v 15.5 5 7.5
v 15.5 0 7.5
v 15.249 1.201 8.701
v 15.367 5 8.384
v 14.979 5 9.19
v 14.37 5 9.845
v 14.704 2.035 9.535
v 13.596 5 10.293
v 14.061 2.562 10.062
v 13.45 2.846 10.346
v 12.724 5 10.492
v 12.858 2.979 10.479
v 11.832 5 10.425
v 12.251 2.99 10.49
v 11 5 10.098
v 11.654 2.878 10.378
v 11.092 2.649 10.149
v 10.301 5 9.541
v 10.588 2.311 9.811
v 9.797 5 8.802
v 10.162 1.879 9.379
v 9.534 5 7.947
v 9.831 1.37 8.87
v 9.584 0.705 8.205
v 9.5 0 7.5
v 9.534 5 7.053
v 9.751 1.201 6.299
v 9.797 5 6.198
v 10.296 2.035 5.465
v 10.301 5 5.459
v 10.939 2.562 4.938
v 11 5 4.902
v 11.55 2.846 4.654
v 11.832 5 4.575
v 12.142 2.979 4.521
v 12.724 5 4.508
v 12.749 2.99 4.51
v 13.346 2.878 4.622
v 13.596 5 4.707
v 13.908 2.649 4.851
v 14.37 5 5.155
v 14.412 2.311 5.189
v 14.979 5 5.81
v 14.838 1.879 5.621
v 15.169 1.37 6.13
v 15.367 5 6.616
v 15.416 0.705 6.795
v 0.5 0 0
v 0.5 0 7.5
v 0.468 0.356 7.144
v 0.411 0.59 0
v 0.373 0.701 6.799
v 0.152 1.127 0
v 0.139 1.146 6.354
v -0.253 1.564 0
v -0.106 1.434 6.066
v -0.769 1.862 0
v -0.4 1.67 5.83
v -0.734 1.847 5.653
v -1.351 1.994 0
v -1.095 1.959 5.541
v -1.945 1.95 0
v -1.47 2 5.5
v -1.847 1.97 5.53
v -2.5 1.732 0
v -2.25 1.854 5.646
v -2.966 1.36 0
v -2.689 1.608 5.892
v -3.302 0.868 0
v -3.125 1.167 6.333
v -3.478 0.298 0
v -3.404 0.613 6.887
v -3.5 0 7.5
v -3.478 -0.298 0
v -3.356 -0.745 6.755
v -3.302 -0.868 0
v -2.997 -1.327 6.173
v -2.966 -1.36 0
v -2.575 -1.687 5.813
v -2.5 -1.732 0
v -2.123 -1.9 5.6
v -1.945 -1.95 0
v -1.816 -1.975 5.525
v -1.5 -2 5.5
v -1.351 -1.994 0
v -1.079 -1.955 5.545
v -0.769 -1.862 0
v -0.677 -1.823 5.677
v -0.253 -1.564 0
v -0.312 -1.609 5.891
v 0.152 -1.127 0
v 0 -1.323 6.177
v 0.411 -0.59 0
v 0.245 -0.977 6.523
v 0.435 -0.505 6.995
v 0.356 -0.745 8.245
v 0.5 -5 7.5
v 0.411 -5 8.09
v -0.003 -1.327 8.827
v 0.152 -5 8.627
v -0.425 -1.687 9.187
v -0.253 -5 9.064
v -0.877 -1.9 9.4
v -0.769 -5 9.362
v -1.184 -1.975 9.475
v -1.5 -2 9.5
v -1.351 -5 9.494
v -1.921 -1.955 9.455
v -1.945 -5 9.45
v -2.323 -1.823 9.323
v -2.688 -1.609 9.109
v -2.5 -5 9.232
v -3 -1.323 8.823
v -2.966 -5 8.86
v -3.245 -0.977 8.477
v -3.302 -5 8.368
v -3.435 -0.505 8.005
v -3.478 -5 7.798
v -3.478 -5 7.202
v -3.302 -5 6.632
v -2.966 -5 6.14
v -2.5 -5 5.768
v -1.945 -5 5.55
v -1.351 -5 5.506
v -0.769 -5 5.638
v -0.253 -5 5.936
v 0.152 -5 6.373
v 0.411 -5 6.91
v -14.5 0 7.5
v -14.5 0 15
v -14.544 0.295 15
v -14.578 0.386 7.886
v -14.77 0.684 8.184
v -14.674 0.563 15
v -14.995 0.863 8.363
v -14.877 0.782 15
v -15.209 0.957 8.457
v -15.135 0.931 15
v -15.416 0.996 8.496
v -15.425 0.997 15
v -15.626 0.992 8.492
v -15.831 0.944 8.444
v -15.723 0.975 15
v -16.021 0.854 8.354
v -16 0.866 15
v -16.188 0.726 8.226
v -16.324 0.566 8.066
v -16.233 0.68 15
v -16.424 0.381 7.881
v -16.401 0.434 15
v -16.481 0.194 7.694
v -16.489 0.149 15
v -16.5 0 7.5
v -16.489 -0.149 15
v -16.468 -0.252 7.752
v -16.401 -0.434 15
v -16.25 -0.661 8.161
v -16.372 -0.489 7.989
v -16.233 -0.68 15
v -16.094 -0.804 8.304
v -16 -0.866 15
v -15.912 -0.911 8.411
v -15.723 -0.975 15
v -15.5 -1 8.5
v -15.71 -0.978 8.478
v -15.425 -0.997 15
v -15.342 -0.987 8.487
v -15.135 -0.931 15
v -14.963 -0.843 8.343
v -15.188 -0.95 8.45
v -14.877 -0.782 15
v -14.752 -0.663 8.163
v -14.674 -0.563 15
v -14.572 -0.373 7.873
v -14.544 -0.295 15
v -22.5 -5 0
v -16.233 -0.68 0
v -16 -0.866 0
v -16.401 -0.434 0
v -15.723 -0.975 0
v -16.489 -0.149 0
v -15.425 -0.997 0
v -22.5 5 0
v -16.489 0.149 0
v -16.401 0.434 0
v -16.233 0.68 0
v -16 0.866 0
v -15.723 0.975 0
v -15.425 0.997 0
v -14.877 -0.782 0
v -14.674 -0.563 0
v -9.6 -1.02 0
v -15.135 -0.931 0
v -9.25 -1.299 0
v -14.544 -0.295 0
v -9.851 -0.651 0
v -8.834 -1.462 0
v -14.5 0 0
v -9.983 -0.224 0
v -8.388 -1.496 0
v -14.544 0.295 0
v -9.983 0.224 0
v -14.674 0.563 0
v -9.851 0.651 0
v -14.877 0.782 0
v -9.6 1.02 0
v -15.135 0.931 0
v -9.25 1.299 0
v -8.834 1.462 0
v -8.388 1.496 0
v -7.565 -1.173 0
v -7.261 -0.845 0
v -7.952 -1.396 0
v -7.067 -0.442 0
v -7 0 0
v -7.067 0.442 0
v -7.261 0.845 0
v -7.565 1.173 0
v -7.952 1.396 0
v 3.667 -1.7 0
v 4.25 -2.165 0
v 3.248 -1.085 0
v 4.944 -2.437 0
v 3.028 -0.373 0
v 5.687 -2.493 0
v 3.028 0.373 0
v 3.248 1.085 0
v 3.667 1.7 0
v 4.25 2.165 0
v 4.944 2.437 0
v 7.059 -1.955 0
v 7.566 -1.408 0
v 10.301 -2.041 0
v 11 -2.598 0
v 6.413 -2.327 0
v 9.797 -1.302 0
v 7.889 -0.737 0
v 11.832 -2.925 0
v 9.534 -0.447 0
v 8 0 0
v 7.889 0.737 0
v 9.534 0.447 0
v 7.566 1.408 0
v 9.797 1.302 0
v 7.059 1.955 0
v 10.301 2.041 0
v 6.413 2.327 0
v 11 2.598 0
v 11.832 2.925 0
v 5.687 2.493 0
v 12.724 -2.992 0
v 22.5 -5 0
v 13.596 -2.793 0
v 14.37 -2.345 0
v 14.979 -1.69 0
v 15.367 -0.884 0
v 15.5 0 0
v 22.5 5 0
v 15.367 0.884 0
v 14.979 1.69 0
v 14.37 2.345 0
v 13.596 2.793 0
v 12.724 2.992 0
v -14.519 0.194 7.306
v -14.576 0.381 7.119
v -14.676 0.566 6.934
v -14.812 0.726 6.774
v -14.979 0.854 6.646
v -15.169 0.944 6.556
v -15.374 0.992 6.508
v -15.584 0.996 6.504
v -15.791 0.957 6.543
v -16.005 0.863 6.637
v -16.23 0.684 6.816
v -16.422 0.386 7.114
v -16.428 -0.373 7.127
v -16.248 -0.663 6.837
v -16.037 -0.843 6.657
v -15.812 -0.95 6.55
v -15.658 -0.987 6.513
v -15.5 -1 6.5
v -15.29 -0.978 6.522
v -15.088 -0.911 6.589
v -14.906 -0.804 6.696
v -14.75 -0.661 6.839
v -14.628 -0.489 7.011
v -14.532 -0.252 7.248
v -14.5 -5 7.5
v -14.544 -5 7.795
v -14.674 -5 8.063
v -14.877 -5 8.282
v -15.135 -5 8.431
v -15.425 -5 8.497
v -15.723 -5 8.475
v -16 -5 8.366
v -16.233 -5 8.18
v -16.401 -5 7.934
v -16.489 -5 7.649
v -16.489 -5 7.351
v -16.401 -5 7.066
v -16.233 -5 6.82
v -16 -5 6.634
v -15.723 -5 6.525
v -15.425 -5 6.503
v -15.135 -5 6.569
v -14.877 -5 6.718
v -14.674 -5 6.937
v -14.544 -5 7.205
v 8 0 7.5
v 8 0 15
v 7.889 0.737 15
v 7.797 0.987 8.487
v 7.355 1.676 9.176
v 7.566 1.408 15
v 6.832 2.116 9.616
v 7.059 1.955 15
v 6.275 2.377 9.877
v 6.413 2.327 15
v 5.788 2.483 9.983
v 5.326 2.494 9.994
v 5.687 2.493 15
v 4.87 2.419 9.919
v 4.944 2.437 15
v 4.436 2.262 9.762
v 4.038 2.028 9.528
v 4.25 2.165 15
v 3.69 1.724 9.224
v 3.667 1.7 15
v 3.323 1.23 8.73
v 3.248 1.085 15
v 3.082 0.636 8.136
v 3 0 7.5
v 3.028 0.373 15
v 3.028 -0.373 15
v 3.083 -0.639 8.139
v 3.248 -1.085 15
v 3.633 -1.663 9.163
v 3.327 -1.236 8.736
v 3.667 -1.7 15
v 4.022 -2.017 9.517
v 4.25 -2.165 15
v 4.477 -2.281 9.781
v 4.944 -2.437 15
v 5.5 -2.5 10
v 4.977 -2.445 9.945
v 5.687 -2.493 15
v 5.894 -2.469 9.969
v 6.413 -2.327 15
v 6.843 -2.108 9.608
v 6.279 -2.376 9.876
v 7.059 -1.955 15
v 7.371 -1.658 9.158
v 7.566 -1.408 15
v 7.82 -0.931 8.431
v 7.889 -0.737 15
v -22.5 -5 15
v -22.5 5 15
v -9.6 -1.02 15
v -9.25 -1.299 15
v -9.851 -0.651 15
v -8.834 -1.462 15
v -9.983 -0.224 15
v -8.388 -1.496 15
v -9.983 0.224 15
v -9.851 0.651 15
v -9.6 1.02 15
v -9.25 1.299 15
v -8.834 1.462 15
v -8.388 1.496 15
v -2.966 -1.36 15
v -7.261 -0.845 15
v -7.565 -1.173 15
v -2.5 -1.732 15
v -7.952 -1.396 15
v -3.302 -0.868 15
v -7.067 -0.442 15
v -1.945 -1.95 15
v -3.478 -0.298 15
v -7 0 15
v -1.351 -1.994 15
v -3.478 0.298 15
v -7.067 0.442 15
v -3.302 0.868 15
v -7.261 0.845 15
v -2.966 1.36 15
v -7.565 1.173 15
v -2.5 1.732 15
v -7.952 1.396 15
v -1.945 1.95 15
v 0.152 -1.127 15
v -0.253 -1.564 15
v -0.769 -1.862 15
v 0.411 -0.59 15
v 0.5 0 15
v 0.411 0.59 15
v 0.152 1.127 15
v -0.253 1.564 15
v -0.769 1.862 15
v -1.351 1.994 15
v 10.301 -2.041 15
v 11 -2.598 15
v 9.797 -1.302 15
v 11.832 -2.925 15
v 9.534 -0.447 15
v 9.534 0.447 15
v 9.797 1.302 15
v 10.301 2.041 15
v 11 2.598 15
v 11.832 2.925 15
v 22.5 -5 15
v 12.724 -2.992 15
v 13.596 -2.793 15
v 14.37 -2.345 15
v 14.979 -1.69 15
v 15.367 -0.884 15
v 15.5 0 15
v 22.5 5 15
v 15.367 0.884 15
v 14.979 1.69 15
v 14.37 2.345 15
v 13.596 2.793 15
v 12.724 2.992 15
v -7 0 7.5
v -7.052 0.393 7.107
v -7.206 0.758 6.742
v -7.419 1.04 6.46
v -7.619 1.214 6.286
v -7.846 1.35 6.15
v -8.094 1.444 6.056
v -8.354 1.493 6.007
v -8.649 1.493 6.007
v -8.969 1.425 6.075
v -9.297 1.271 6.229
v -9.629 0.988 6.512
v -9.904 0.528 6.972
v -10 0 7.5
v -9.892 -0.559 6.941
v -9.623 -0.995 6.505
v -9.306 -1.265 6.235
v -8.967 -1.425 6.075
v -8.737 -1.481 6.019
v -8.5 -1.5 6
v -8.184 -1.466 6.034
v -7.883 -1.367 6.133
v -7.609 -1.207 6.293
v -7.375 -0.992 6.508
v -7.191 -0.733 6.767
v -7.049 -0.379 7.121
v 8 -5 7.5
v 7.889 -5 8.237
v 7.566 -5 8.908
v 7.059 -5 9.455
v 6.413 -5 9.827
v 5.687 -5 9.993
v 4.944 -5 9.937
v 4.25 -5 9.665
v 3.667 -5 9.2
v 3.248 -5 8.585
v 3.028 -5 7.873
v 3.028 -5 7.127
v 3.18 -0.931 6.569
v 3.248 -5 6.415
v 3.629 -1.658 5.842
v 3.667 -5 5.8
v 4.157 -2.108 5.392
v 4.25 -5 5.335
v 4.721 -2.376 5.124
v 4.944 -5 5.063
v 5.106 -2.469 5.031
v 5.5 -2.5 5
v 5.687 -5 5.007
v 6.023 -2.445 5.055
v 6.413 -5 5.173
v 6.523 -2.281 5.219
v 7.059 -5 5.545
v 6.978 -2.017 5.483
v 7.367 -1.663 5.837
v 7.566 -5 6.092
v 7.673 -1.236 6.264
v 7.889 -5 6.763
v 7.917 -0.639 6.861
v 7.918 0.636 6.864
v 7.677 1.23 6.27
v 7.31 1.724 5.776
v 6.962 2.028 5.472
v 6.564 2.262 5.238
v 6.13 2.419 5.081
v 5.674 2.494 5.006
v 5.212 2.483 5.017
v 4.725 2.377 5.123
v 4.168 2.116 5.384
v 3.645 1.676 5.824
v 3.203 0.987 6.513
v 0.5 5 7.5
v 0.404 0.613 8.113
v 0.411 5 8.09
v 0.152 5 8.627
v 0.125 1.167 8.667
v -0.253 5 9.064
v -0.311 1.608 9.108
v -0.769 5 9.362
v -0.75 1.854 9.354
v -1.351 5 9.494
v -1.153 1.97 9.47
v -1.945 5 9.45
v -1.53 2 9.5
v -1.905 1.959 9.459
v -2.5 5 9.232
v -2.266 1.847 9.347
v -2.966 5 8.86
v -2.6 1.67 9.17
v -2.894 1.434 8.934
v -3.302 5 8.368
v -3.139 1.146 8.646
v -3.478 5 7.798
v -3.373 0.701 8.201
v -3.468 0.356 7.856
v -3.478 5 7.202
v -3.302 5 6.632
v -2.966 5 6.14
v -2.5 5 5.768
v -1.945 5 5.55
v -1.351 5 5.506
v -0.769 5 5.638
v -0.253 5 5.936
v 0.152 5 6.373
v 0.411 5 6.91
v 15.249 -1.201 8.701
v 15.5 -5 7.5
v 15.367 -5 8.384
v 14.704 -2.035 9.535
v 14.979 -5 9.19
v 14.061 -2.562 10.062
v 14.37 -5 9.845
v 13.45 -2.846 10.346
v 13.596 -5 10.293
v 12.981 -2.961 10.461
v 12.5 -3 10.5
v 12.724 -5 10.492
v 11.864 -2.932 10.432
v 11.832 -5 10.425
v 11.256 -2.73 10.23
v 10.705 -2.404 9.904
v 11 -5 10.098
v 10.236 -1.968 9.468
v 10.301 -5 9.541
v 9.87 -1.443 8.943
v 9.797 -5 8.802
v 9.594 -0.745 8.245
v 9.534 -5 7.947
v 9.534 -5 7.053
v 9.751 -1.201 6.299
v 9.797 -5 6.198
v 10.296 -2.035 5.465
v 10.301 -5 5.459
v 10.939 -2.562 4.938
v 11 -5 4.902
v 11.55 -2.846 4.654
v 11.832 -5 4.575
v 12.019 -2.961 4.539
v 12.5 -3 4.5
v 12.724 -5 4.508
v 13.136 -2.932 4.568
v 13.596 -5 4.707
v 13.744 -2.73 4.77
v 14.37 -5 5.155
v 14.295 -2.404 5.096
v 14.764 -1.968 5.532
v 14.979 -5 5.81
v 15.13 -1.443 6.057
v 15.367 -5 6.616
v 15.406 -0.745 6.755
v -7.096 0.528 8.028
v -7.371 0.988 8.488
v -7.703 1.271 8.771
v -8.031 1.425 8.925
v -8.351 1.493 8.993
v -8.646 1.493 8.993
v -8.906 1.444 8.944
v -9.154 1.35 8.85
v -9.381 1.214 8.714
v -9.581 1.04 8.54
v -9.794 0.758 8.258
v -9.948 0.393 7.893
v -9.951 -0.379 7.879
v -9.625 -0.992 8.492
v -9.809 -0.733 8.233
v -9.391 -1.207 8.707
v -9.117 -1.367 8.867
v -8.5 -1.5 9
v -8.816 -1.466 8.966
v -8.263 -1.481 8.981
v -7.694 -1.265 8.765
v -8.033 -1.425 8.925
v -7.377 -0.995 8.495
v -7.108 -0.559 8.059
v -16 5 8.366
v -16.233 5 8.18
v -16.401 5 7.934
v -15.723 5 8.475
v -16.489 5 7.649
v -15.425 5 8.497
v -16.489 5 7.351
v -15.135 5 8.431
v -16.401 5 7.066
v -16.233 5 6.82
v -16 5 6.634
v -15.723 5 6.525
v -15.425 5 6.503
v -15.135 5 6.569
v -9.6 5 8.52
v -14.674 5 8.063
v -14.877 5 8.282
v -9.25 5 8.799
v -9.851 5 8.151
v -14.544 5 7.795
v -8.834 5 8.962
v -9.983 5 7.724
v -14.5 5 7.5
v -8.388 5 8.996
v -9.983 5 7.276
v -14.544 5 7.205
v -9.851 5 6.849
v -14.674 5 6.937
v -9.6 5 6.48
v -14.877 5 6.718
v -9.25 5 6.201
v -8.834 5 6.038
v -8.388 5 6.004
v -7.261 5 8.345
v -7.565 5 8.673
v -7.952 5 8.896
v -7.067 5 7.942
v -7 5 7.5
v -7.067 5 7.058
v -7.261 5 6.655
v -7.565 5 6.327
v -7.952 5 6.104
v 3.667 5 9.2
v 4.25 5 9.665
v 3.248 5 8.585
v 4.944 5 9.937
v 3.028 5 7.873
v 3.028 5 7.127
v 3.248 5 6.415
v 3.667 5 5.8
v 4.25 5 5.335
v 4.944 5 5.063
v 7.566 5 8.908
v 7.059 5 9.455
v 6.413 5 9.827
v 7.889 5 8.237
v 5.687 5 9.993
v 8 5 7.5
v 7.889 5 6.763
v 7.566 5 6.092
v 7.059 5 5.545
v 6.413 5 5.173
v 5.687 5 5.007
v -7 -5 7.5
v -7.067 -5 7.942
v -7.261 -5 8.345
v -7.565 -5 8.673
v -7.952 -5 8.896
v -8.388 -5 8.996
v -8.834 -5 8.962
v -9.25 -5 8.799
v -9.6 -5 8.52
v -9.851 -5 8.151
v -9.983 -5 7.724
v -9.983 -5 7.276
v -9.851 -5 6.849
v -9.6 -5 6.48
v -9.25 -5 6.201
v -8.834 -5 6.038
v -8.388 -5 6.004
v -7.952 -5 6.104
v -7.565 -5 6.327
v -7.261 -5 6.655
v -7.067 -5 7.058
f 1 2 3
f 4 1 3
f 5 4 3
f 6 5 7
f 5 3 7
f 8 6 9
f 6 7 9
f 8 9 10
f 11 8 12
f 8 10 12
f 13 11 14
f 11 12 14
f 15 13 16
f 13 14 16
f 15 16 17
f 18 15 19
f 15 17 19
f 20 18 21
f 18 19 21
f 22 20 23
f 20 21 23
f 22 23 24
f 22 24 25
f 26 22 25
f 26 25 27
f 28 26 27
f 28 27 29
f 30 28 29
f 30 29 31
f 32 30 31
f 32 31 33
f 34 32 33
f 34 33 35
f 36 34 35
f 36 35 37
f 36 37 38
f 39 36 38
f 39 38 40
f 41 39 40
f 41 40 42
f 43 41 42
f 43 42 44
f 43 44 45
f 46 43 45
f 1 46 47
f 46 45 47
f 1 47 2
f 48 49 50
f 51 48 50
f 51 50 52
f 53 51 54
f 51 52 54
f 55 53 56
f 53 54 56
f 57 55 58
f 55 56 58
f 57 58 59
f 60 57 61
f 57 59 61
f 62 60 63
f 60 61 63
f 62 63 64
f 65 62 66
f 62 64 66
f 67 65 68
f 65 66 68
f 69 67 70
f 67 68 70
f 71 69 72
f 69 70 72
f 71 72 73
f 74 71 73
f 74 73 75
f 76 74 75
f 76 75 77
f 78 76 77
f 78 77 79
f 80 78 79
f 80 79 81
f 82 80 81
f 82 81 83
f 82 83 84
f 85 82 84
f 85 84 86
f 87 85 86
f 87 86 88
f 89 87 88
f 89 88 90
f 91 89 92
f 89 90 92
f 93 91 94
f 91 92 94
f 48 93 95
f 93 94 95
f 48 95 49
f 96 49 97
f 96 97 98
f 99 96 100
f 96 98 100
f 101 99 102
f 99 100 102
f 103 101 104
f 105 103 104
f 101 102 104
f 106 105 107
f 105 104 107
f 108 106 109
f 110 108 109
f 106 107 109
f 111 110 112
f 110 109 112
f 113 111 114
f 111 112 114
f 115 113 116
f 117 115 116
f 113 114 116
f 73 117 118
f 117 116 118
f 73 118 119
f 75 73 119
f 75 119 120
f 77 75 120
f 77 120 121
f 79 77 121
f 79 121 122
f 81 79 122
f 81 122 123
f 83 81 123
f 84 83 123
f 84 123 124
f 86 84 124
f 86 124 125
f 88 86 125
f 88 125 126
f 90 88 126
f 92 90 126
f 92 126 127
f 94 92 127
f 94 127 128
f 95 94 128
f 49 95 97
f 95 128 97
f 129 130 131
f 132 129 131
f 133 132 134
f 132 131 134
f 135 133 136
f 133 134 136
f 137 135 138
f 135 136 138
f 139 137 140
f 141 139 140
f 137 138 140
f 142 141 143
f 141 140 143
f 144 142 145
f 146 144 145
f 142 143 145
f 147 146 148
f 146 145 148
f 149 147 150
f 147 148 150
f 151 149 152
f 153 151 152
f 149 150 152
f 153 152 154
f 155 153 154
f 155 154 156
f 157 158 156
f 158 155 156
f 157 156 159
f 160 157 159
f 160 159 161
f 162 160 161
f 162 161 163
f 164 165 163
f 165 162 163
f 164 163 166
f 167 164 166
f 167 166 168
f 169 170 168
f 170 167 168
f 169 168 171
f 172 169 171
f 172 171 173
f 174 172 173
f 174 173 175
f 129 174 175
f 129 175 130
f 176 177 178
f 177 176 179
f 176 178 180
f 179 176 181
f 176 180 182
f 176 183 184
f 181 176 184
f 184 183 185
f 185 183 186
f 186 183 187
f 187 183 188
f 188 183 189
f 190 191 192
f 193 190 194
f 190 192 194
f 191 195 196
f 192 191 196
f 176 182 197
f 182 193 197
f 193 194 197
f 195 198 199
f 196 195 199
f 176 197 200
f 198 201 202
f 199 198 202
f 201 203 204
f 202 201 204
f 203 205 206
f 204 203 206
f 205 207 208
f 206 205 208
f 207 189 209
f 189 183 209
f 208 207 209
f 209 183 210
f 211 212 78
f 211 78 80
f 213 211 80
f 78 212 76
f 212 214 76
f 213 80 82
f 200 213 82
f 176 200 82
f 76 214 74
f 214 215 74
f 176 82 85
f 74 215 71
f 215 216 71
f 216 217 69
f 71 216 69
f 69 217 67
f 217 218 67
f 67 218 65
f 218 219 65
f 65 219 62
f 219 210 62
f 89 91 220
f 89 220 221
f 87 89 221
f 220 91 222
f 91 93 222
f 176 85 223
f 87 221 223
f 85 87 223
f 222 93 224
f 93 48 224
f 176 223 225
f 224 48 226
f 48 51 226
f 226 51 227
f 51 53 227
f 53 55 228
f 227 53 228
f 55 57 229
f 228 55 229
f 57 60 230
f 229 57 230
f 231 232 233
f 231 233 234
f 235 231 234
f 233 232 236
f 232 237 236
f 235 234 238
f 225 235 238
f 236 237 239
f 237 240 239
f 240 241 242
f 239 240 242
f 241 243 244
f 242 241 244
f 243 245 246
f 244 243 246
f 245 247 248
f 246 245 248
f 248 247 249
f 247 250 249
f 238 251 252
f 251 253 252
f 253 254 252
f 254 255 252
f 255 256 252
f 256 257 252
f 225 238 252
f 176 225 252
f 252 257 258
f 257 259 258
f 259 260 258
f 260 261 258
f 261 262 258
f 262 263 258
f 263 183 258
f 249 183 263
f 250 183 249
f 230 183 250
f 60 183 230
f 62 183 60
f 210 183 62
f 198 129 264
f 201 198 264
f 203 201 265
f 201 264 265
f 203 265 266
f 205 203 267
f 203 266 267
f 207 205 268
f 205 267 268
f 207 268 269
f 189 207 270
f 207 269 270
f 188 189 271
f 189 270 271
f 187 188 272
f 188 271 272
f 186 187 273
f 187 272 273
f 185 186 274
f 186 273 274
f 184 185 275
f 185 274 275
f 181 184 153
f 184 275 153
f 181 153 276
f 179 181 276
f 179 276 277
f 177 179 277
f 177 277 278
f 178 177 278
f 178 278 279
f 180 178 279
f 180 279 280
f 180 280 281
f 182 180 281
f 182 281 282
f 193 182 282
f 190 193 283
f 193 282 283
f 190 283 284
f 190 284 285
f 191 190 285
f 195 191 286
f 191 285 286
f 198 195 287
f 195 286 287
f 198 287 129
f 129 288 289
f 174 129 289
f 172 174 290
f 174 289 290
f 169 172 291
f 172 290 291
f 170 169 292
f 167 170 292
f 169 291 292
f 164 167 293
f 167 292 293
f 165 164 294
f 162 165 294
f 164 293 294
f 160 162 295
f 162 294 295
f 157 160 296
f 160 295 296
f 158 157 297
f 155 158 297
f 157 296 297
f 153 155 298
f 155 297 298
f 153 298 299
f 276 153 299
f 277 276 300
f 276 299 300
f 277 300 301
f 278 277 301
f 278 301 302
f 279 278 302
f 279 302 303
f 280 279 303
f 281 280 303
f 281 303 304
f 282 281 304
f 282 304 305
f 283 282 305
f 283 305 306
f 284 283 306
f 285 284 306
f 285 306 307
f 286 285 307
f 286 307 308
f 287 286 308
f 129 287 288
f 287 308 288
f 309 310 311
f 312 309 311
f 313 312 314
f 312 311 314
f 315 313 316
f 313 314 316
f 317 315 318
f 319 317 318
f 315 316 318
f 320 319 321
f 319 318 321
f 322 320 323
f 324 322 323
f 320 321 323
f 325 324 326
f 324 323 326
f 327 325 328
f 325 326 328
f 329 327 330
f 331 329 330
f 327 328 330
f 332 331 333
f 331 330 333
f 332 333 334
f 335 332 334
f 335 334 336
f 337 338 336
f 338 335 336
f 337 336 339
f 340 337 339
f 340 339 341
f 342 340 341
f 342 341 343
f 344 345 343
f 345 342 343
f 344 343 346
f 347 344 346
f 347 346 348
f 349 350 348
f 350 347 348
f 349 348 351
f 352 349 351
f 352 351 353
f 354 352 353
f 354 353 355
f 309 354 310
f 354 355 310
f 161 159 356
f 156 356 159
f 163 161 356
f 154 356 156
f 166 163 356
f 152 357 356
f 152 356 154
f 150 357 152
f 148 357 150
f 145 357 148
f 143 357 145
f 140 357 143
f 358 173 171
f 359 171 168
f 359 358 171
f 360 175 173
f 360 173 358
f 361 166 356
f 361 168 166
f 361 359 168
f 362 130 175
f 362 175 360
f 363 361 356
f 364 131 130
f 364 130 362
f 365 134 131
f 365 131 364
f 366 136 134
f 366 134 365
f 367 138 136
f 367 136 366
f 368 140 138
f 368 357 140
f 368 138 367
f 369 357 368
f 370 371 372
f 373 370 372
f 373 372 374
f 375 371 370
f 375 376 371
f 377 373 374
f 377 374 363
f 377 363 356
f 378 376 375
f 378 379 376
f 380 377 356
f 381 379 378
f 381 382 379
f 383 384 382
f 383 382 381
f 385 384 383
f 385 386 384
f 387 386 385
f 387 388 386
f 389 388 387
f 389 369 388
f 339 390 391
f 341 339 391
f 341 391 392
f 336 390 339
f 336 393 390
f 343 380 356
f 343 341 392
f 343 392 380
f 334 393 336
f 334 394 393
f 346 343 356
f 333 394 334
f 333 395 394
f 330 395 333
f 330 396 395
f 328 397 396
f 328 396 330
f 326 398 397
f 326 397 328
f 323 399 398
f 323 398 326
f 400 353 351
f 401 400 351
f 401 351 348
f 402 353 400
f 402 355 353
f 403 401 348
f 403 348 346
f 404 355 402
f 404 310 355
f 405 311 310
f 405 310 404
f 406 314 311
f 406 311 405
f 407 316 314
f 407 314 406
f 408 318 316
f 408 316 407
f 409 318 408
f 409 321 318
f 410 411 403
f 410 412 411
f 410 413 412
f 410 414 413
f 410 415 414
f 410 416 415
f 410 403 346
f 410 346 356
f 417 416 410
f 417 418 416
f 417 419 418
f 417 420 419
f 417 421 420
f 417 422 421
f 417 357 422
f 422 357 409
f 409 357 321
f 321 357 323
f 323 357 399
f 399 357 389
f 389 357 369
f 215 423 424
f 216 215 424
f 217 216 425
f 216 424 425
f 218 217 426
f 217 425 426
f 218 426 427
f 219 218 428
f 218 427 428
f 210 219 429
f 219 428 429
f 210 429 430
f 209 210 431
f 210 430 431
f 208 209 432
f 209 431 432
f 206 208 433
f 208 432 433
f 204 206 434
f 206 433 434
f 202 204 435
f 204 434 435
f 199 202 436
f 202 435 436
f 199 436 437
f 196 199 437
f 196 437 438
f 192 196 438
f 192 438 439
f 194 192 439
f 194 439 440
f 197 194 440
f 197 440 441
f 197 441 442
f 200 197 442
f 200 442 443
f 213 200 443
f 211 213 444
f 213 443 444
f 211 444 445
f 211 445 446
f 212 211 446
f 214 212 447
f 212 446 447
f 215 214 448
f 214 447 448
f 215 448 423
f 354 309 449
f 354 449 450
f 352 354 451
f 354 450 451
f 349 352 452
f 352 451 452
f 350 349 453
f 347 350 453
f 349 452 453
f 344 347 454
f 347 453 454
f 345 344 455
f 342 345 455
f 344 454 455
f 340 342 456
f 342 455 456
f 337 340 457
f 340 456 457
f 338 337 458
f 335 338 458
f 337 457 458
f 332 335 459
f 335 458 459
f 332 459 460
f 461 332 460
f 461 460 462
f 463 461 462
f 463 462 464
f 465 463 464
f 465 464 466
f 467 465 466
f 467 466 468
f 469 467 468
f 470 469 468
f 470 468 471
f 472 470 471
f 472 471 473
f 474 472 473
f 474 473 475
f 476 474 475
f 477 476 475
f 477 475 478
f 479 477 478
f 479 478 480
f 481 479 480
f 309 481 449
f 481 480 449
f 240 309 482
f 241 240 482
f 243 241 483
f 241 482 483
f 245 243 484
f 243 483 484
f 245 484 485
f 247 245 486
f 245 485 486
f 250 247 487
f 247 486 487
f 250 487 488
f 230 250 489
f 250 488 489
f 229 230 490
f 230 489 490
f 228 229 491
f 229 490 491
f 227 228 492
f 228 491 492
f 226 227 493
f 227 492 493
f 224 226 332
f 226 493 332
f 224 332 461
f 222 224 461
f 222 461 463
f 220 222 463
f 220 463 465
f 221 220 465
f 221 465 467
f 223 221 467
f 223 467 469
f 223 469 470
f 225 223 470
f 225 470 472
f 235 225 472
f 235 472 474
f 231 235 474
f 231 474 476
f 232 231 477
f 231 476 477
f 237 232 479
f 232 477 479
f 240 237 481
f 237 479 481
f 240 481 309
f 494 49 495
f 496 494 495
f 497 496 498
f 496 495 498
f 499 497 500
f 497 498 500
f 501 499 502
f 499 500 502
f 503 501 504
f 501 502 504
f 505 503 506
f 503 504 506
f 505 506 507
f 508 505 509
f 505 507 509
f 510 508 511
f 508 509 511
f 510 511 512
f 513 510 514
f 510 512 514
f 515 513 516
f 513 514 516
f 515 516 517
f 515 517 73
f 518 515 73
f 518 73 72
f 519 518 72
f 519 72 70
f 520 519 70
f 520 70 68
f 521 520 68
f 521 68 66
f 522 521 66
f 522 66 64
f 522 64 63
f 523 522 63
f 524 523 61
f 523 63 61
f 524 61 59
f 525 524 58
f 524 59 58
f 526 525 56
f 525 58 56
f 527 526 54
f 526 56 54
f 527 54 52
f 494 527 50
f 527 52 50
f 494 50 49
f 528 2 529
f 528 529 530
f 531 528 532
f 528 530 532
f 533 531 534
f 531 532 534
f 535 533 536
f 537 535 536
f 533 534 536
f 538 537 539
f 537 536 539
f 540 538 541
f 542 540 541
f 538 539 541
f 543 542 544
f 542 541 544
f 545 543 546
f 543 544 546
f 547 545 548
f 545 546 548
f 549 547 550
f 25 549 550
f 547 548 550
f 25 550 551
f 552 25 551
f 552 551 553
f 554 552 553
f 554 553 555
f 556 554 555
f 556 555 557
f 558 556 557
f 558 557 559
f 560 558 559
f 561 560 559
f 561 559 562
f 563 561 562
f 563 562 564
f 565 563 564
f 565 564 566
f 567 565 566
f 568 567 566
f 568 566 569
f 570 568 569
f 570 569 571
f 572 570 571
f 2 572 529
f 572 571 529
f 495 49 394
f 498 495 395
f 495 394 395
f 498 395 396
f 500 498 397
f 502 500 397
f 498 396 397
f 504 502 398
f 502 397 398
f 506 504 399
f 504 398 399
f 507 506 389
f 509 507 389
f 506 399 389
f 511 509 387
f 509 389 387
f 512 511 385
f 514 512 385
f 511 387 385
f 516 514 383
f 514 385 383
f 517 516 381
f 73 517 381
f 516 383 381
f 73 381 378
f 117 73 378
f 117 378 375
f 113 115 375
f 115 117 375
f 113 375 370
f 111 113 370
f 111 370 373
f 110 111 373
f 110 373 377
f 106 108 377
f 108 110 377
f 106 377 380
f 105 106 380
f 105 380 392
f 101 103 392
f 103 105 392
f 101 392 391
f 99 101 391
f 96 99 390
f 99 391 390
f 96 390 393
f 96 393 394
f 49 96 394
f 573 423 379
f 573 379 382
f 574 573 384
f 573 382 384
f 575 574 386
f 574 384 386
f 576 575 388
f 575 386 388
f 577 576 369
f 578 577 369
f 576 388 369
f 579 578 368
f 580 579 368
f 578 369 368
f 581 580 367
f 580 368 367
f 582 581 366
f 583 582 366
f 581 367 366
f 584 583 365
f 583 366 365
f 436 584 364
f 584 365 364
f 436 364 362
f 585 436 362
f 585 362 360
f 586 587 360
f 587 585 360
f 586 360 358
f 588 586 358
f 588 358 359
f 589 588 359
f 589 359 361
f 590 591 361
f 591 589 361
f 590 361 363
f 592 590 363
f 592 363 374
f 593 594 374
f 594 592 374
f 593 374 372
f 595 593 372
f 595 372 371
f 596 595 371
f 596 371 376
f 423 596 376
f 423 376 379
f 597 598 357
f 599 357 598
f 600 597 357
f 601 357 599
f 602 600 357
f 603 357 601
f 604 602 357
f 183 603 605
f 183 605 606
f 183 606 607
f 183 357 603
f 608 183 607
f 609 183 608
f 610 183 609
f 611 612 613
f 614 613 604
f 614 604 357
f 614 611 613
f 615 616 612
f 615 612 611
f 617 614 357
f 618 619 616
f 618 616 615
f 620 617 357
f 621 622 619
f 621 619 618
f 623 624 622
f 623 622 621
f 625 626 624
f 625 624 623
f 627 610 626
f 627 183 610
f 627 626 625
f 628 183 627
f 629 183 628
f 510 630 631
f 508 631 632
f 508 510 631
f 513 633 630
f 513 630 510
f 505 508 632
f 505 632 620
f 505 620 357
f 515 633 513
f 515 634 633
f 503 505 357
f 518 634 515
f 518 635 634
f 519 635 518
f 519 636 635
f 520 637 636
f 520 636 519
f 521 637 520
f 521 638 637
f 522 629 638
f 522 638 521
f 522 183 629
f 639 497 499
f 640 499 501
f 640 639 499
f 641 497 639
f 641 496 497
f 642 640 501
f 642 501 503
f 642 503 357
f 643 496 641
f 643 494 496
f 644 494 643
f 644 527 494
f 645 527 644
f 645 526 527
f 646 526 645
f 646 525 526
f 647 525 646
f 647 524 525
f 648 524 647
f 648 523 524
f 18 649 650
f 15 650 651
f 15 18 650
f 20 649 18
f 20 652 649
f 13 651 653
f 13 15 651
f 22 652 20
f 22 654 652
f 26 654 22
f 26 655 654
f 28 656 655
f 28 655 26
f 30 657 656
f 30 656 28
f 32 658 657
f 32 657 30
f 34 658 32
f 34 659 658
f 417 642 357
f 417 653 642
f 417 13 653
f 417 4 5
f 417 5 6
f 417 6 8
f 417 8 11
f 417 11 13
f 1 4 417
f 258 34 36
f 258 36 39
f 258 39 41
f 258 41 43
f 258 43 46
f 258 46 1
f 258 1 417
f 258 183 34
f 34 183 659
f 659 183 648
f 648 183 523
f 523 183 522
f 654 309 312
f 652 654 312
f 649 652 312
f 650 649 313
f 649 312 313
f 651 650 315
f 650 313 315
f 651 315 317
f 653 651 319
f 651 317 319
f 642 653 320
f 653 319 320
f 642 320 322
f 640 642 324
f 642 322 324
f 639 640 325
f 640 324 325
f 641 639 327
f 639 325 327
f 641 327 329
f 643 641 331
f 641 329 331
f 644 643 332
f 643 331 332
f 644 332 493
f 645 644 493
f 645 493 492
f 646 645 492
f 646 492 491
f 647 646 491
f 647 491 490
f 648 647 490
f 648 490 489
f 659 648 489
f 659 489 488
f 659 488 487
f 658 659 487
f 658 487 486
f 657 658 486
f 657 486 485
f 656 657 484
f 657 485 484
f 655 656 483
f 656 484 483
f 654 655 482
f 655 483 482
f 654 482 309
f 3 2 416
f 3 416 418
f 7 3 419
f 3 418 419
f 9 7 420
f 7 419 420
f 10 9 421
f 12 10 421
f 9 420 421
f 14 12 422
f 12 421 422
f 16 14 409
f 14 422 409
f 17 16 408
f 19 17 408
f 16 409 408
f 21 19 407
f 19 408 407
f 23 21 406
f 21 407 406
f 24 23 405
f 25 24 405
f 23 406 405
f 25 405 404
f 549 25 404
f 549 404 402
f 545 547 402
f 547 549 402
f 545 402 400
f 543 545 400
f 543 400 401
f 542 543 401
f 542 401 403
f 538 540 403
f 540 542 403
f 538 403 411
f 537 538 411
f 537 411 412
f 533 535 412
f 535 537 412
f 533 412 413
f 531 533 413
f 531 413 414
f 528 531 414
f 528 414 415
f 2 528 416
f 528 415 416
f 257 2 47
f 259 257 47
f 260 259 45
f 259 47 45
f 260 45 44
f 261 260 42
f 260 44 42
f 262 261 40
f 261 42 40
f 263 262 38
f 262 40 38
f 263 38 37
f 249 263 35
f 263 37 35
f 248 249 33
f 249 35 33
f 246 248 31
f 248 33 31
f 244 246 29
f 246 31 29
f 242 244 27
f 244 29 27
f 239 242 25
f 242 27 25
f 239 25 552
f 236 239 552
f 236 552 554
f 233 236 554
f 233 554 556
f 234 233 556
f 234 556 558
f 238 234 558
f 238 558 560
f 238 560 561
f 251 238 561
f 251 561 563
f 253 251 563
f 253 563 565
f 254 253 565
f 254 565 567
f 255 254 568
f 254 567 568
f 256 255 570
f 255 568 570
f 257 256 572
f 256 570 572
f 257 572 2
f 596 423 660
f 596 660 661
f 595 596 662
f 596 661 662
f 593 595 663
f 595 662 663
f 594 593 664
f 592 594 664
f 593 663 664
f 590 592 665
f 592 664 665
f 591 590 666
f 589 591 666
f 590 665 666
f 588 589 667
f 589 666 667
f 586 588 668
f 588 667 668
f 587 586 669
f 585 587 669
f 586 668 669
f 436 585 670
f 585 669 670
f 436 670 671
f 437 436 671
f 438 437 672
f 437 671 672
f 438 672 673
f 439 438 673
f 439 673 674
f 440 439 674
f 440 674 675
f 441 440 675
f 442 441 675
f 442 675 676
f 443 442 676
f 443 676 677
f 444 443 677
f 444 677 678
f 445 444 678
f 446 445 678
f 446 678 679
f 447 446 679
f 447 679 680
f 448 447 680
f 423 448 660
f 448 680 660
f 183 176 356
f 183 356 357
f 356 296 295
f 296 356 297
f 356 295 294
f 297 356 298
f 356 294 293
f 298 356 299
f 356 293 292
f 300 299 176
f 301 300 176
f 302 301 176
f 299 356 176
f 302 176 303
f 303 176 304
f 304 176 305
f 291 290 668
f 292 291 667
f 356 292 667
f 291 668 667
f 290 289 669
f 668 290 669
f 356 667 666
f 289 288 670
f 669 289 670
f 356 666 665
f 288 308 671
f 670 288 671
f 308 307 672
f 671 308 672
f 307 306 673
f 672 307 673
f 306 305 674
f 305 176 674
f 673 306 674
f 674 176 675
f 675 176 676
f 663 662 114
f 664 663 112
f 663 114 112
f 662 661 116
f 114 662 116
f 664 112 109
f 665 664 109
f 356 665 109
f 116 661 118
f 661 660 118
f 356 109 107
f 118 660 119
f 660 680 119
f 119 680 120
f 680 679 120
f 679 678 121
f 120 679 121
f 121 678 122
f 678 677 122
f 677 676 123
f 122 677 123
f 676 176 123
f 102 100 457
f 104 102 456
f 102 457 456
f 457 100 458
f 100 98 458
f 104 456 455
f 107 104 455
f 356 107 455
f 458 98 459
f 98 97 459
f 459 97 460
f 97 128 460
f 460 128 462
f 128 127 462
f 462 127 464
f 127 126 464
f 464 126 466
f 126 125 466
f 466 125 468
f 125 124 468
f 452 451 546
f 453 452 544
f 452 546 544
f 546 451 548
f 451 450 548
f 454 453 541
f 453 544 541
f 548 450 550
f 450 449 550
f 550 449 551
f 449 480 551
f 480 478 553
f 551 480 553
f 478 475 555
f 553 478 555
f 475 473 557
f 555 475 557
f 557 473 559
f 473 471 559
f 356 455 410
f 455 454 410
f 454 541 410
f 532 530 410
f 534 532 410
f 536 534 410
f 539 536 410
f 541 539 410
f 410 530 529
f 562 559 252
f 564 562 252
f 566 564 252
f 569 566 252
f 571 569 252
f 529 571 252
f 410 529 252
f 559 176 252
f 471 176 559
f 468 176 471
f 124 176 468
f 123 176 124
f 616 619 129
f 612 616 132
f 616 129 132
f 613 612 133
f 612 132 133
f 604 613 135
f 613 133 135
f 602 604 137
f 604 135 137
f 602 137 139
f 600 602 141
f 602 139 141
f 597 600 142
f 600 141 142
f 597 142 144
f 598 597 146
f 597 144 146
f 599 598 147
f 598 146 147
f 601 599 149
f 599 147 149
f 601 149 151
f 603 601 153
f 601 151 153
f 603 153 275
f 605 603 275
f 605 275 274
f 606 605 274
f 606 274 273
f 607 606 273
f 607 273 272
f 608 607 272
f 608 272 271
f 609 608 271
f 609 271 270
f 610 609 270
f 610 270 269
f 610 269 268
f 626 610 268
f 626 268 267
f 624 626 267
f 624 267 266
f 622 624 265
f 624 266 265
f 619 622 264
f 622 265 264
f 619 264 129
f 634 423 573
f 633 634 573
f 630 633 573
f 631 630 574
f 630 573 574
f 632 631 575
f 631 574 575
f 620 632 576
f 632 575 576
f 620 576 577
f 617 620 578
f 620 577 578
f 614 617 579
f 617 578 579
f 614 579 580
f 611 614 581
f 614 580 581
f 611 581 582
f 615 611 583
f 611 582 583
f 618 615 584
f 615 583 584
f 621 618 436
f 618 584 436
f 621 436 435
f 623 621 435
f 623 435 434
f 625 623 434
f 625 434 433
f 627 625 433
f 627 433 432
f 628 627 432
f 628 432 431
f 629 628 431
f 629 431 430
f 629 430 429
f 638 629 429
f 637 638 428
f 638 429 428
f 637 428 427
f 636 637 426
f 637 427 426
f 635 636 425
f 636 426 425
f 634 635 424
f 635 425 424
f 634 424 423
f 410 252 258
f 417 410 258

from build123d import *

# Parameters (mm, degrees)
F0_W     = 45
F0_H     = 10
F1_DEPTH = 15
F2_R     = 1
F2_R_2   = 1.5
F2_R_3   = 2
F2_R_4   = 2.5
F2_R_5   = 3
F3_DEPTH = 10
F4_R     = 1
F4_R_2   = 1.5
F4_R_3   = 2
F4_R_4   = 2.5
F4_R_5   = 3
F5_DEPTH = 15


with BuildPart() as f1:
    # F0 (on Top) → F1 (new body)
    with BuildSketch(Plane.XY):
        Rectangle(F0_W, F0_H)
    extrude(amount=F1_DEPTH)

    # F2 (on face) → F3 (cut, through all)
    with BuildSketch(Plane.XZ.offset(5)):
        with Locations((-15.5, 7.5)):
            Circle(F2_R)
        with Locations((-8.5, 7.5)):
            Circle(F2_R_2)
        with Locations((-1.5, 7.5)):
            Circle(F2_R_3)
        with Locations((5.5, 7.5)):
            Circle(F2_R_4)
        with Locations((12.5, 7.5)):
            Circle(F2_R_5)
    extrude(amount=-F3_DEPTH, mode=Mode.SUBTRACT)

    # F4 (on face) → F5 (cut, through all)
    with BuildSketch(Plane.XY.offset(15)):
        with Locations((-15.5, 0)):
            Circle(F4_R)
        with Locations((-8.5, 0)):
            Circle(F4_R_2)
        with Locations((-1.5, 0)):
            Circle(F4_R_3)
        with Locations((5.5, 0)):
            Circle(F4_R_4)
        with Locations((12.5, 0)):
            Circle(F4_R_5)
    extrude(amount=-F5_DEPTH, mode=Mode.SUBTRACT)


solid = f1.part
